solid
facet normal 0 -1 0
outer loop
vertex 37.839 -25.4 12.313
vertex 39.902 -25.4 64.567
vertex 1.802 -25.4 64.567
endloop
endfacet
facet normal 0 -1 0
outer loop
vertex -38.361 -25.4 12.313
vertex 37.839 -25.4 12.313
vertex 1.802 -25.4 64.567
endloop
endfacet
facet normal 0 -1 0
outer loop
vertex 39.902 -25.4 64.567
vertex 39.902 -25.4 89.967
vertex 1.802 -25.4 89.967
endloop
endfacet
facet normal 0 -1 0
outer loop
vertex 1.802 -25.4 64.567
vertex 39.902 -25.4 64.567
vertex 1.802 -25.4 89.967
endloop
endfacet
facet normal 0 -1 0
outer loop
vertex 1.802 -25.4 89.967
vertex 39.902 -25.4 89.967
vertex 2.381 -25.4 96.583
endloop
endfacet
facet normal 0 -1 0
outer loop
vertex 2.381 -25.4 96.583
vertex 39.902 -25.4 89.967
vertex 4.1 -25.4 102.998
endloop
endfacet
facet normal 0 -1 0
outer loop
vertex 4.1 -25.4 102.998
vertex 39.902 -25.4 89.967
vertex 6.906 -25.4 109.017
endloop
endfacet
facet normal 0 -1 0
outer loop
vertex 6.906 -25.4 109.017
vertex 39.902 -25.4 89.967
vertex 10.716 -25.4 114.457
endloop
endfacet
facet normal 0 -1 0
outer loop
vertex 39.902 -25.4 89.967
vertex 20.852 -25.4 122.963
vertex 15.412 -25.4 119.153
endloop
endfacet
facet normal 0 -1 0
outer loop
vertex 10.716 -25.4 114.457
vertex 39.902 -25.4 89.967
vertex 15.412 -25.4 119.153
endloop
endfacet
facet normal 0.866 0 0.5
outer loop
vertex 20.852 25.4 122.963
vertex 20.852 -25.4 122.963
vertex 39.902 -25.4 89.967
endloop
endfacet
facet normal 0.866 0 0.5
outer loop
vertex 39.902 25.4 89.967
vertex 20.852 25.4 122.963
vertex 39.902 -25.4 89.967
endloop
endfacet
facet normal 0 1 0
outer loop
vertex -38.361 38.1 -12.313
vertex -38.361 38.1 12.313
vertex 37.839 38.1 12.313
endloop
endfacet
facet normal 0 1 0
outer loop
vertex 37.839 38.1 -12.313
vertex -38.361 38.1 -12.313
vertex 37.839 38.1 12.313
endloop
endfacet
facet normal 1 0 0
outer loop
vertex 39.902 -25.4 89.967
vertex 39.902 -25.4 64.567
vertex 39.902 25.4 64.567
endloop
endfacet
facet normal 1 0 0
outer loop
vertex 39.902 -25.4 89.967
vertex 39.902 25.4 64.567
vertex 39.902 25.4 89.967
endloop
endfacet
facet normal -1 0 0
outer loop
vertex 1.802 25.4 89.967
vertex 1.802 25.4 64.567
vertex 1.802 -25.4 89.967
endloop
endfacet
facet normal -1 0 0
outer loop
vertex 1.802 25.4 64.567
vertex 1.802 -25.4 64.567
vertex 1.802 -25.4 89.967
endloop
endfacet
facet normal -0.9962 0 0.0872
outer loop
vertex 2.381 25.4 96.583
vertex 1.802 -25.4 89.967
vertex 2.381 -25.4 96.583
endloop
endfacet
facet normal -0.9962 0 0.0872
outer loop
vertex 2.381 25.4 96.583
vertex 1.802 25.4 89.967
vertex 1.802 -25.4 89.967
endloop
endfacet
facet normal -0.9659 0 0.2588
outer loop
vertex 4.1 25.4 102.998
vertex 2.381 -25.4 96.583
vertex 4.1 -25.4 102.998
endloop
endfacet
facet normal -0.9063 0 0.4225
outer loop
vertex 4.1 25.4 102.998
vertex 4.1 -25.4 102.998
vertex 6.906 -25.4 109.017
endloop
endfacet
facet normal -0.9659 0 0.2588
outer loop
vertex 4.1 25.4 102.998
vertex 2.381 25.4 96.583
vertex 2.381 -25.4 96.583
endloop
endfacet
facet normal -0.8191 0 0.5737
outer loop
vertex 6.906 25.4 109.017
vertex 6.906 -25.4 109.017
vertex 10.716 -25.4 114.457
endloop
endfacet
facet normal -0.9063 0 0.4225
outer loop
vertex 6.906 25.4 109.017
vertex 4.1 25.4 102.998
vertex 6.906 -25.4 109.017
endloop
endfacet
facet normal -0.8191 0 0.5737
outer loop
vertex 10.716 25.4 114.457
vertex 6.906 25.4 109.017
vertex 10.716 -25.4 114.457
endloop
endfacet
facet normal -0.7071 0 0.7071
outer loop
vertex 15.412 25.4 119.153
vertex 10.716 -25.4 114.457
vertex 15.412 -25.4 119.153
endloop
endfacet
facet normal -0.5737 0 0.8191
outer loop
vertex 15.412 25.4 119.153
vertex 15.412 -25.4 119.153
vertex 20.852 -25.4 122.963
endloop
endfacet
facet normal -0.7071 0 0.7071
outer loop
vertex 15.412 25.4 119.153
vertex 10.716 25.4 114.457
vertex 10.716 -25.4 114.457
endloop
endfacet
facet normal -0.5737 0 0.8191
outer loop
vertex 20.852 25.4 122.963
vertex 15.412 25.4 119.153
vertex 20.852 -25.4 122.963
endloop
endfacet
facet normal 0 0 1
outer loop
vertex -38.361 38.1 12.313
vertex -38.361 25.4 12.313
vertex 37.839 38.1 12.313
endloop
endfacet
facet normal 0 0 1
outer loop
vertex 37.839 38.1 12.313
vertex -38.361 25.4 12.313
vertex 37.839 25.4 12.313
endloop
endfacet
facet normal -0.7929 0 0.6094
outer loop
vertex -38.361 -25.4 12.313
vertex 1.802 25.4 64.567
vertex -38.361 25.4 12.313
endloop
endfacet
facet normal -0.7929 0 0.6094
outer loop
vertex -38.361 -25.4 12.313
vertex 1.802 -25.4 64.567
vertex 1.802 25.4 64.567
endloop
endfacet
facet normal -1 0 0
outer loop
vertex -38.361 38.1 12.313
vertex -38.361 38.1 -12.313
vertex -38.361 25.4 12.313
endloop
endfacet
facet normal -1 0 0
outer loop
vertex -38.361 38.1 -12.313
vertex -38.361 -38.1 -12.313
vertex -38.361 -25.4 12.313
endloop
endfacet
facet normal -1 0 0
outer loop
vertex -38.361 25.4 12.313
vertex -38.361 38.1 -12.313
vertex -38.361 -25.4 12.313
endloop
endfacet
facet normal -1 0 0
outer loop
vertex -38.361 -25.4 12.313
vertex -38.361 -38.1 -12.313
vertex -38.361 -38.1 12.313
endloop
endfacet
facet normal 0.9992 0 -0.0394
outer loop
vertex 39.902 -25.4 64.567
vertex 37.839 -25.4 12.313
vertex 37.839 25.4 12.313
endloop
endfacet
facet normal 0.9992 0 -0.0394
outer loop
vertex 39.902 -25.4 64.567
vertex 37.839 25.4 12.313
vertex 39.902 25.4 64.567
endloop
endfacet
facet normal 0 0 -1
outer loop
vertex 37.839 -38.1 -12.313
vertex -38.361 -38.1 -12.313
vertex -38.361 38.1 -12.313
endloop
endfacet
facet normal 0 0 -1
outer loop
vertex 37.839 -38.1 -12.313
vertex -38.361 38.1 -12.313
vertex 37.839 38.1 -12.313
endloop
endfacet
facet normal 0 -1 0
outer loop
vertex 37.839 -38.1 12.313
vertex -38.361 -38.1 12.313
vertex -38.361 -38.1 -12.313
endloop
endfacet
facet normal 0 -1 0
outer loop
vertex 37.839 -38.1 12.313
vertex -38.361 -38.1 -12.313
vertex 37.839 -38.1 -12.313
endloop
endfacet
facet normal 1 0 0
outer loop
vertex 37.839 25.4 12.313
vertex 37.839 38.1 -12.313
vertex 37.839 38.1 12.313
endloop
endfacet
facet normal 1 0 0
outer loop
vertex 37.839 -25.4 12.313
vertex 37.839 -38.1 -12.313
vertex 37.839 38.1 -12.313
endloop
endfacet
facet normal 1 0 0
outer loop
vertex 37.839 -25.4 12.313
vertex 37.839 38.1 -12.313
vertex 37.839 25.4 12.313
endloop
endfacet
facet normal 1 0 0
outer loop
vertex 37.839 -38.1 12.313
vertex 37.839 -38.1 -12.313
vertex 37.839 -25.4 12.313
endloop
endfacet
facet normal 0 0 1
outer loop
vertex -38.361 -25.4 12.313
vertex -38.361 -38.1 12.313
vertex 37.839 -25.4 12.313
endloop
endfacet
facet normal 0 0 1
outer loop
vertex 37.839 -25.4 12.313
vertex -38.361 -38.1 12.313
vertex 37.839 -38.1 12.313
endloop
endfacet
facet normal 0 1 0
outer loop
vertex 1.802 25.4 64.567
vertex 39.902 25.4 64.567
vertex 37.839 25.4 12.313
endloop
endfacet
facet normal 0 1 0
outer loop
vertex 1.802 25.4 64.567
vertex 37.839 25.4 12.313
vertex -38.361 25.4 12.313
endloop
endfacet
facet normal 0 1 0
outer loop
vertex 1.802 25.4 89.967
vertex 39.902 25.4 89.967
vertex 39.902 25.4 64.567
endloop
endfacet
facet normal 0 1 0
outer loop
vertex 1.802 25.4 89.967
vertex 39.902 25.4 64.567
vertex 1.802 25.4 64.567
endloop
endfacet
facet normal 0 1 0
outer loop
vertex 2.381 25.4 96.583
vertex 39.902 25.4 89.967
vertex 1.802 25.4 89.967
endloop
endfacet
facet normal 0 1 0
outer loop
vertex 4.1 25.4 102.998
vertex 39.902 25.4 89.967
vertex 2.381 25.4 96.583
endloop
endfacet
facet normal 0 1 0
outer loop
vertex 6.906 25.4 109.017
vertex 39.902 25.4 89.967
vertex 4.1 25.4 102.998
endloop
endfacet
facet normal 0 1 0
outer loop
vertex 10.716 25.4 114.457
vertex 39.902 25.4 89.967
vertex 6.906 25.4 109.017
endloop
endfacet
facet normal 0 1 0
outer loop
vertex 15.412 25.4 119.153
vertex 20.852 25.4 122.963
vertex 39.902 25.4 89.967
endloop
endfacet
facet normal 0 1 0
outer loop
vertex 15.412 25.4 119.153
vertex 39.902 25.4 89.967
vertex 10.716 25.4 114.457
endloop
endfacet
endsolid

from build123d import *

# Parameters (mm, degrees)
F0_W      = 76.2
F0_H      = 24.6256076701
F1_DEPTH  = 38.1
F0_W_2    = 38.1
F0_H_2    = 25.4
F2_DEPTH  = 25.4
F2_FACE_W = 38.1
F2_FACE_H = 50.8
F3_ANGLE  = 60


with BuildPart() as f1:
    # F0 (on Front) → F1 (new body, symmetric)
    with BuildSketch(Plane.XZ):
        with Locations((-0.260655035, 0)):
            Rectangle(F0_W, F0_H)
    extrude(amount=F1_DEPTH, both=True)

    # F0 (on Front) → F2 (join, symmetric)
    with BuildSketch(Plane.XZ):
        with Locations((-0.260655035, 0)):
            Rectangle(F0_W, F0_H)
        Polygon((-38.360655035, 12.3128038351), (37.839344965, 12.3128038351), (39.9018798504, 64.5671242428), (1.8018798504, 64.5671242428), align=None)
        with Locations((20.8518798504, 77.2671242428)):
            Rectangle(F0_W_2, F0_H_2)
    extrude(amount=F2_DEPTH, both=True)

    # F2_face (on face) → F3 (revolve)
    with BuildSketch(Plane(origin=(20.8518798504, 0, 89.9671242428), x_dir=(1, 0, 0), z_dir=(0, 0, 1))):
        Rectangle(F2_FACE_W, F2_FACE_H)
    revolve(axis=Axis((39.9018798504, 0, 89.9671242428), (0, 1, 0)), revolution_arc=F3_ANGLE)


solid = f1.part
